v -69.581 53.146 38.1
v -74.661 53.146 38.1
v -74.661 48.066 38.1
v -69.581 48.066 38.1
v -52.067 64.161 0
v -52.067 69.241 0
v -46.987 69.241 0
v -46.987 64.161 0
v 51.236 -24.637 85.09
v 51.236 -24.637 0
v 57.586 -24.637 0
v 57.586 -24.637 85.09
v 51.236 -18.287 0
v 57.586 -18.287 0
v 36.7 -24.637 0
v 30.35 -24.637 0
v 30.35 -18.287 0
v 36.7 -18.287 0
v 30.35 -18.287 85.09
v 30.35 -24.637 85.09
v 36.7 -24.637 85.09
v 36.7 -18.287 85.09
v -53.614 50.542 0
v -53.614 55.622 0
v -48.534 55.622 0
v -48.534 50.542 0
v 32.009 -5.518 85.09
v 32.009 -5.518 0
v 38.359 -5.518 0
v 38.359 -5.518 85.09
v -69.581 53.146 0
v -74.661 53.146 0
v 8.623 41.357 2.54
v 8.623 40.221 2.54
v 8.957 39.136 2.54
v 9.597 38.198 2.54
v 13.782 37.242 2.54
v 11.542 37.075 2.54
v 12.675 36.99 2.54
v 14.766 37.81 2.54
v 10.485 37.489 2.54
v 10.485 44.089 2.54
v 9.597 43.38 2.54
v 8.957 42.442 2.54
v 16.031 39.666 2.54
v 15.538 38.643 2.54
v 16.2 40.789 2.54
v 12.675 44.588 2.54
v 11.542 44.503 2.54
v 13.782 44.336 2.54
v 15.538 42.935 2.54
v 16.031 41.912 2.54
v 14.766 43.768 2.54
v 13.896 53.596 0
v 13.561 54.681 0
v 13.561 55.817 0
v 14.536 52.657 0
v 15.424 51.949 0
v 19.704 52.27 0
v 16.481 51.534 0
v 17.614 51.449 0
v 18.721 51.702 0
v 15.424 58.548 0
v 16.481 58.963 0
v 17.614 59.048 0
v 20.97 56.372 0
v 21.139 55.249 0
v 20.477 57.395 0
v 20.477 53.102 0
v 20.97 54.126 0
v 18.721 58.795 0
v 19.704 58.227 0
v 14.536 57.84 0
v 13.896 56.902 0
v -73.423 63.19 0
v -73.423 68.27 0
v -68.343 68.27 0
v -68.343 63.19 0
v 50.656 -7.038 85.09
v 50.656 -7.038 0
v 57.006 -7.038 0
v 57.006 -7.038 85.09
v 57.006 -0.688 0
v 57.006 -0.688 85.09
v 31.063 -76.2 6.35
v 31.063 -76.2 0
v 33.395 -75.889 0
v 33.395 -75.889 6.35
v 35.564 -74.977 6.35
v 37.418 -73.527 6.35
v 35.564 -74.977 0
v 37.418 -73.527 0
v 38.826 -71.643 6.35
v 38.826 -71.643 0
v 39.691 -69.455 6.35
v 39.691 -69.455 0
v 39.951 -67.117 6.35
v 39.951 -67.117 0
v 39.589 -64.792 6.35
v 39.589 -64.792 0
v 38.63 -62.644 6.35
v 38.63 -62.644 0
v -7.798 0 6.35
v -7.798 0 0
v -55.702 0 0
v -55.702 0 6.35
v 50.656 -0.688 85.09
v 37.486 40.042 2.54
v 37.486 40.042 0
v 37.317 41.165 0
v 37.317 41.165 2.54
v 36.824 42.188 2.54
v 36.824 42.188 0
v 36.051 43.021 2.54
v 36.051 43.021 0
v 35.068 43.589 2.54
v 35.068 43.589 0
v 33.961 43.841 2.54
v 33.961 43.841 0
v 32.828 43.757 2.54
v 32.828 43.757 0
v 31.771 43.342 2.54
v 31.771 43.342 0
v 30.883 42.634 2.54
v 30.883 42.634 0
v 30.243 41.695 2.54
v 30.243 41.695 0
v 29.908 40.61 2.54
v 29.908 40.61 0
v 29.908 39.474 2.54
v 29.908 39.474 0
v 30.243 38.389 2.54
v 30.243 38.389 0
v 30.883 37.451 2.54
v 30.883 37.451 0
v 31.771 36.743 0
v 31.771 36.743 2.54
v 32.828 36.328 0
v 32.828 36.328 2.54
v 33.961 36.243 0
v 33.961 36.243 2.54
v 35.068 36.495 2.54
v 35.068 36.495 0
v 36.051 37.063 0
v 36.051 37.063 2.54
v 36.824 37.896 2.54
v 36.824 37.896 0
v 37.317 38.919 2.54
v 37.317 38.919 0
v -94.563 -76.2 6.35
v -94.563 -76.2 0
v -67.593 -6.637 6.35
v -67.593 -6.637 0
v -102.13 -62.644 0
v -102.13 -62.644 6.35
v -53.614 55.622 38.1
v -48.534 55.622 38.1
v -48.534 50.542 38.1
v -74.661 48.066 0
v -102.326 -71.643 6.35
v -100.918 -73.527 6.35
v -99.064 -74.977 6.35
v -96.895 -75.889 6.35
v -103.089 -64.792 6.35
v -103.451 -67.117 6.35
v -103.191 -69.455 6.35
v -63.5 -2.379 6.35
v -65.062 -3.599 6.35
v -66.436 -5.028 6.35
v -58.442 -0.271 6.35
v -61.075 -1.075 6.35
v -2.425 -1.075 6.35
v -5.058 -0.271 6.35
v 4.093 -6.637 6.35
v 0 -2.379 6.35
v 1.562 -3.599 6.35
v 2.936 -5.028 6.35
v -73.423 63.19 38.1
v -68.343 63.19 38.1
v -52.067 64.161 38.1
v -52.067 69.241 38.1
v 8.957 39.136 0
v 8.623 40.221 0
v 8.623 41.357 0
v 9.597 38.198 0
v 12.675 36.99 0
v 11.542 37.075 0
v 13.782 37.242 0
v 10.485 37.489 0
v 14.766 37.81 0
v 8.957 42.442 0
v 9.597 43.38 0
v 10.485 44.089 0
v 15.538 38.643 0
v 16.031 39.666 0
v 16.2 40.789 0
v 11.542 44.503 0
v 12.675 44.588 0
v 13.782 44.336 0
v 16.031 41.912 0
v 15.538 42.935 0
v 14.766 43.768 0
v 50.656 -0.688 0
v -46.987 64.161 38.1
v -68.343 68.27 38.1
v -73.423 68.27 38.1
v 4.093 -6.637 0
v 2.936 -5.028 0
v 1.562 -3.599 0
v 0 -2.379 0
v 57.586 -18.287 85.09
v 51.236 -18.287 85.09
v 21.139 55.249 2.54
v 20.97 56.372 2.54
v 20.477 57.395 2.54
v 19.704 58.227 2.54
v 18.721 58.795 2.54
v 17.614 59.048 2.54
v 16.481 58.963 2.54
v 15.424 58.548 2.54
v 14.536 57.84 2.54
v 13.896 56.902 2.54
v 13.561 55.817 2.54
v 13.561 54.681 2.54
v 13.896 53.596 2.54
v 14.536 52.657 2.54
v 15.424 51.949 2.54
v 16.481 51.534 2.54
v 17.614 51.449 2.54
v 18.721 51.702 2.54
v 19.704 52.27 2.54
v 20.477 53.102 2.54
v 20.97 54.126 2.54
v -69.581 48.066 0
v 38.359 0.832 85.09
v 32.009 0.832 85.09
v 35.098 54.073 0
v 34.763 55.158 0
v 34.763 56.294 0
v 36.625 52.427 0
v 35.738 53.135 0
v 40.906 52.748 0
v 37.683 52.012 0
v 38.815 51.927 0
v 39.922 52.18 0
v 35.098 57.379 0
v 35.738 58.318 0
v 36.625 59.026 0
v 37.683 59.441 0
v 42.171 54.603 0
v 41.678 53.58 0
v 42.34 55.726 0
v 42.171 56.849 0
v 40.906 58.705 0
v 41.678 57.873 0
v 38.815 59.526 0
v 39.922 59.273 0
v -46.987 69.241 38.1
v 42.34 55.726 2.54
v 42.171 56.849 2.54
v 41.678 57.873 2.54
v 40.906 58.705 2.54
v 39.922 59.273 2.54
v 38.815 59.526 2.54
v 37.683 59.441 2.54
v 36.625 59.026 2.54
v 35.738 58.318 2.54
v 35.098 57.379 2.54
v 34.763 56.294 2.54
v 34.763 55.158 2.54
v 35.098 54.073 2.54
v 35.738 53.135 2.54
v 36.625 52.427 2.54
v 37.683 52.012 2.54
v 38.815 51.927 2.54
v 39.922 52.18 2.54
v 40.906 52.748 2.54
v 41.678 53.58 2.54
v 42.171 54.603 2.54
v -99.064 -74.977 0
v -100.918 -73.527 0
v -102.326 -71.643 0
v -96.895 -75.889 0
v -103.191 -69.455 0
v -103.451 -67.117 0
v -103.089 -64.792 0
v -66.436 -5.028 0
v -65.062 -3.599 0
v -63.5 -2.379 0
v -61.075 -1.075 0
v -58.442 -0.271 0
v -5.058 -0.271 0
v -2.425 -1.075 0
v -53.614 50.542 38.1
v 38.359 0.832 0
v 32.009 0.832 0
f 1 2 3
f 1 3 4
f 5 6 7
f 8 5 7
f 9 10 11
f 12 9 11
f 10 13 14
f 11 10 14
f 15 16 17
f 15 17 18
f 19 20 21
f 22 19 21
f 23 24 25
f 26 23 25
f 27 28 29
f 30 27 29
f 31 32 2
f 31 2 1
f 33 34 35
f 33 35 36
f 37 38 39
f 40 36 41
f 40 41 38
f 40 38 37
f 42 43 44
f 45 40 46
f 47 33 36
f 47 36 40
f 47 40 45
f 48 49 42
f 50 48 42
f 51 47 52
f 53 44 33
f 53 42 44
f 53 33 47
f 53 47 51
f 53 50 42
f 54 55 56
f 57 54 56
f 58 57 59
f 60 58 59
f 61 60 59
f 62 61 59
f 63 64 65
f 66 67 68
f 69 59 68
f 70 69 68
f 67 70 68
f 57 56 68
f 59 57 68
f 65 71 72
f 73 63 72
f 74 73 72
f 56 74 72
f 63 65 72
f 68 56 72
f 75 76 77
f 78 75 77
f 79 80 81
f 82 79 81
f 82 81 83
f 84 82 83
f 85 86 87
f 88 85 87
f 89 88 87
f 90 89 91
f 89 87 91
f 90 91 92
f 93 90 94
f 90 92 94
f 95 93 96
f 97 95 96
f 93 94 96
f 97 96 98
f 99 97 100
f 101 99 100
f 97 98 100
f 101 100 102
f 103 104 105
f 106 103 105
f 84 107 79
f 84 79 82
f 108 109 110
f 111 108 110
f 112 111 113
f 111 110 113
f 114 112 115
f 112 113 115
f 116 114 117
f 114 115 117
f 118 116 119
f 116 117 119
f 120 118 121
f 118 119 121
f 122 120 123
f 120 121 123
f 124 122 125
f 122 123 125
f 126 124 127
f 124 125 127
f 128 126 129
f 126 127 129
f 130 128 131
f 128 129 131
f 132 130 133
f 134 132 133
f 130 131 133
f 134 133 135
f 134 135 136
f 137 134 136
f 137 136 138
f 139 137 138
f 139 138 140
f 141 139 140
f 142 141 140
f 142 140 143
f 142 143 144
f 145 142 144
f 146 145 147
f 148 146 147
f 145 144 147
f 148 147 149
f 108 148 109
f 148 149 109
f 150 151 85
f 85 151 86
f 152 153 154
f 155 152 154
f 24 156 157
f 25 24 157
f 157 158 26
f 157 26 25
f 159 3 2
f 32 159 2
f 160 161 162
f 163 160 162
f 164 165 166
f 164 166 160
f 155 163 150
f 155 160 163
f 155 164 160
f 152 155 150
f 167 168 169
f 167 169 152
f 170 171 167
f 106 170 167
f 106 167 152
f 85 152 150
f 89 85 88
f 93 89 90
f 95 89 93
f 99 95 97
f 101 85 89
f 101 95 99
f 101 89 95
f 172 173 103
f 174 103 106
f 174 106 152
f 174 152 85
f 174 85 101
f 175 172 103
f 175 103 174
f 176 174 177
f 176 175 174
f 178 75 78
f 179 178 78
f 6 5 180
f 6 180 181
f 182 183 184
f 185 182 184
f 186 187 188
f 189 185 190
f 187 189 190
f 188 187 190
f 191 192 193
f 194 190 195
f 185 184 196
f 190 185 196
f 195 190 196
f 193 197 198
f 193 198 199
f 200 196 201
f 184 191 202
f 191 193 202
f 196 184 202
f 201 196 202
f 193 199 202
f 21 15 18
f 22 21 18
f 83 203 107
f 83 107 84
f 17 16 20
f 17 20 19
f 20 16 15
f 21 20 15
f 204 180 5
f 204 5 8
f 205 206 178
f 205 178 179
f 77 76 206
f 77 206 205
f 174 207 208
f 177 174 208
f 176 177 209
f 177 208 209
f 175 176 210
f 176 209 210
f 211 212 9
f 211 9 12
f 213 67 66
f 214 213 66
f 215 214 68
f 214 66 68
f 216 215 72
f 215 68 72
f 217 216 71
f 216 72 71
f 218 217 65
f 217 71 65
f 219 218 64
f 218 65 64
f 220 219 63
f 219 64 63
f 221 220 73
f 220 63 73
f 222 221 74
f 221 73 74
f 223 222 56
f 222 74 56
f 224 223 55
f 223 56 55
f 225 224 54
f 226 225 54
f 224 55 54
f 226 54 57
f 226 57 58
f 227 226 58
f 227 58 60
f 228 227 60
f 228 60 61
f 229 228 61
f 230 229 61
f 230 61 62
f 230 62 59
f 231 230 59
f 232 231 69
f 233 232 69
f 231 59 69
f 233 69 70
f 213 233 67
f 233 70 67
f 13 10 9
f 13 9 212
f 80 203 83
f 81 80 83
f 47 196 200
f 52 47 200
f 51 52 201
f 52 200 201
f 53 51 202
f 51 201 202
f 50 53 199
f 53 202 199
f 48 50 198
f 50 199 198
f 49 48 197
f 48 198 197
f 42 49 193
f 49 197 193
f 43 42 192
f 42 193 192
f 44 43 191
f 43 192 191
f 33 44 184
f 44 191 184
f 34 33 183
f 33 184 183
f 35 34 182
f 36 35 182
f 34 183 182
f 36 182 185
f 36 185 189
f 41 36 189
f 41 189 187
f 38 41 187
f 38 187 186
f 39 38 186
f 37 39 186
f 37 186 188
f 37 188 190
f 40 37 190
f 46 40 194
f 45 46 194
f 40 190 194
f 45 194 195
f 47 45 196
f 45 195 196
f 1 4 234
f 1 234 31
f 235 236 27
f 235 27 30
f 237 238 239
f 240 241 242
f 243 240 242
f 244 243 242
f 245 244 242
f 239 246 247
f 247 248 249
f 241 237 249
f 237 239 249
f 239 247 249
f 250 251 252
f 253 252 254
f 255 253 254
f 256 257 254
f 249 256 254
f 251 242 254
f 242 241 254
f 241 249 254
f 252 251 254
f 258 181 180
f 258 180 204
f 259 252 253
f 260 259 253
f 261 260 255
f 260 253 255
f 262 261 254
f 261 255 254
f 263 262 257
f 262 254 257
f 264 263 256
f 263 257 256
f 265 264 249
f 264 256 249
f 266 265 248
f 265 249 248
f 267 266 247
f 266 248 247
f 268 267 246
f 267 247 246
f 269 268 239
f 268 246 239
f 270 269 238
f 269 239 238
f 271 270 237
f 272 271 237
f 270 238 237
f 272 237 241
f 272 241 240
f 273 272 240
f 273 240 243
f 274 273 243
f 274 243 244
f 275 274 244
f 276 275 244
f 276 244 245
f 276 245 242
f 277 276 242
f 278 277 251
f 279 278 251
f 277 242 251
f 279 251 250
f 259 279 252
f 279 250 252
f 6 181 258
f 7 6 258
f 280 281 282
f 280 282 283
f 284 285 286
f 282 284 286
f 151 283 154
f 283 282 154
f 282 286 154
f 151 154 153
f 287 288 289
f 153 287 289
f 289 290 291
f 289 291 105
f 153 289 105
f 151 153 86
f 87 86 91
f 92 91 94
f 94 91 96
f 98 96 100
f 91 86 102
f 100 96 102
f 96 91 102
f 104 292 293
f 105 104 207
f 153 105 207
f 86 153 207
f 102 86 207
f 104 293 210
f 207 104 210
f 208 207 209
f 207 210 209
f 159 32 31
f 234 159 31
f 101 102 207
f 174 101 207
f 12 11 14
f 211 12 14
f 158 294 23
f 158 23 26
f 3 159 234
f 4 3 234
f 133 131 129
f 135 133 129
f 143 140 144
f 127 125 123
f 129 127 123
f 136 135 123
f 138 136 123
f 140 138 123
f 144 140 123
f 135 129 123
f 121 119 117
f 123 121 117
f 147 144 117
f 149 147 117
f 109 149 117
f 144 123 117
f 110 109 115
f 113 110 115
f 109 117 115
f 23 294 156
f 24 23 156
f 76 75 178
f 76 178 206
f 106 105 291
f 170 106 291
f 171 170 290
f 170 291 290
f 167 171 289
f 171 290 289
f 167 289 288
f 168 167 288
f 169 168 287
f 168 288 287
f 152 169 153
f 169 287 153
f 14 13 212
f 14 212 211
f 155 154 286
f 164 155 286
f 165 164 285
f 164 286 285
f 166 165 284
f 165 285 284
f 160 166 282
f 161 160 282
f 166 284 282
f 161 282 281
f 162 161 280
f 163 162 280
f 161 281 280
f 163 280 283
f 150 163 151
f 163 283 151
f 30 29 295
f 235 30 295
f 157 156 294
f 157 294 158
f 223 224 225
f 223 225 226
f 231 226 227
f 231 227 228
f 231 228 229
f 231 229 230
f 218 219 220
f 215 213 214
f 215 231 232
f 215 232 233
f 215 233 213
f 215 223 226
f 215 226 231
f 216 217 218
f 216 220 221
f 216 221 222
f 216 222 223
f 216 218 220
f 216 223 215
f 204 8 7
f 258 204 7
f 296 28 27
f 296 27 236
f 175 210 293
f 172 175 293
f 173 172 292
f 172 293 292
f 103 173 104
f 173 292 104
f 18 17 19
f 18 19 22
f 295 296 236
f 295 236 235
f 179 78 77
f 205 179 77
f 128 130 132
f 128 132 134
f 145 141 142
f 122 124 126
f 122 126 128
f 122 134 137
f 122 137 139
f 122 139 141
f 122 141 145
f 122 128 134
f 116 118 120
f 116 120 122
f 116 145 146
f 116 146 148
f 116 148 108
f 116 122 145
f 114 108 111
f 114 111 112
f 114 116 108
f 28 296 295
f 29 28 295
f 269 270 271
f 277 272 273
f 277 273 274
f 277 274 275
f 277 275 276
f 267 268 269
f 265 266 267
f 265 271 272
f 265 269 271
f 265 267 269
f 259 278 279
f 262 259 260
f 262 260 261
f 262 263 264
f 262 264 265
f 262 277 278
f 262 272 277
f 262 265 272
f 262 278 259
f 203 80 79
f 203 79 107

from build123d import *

# Parameters (mm, degrees)
F1_DEPTH = 6.35
F2_W     = 6.35
F2_H     = 6.35
F3_DEPTH = 85.09
F4_W     = 5.08
F4_H     = 5.08
F5_DEPTH = 38.1
F6_R     = 3.81
F7_DEPTH = 2.54


with BuildPart() as f1:
    # F0 (on Top) → F1 (new body)
    with BuildSketch(Plane.XY):
        with BuildLine():
            Line((-63.5, -76.2), (-63.5, -2.378866))
            ThreePointArc((-63.5, -2.378866), (-65.774133, -4.289297), (-67.593005, -6.637305))
            Line((-67.593005, -6.637305), (-102.130306, -62.643739))
            ThreePointArc((-102.130306, -62.643739), (-102.325972, -71.642958), (-94.563397, -76.2))
            Line((-94.563397, -76.2), (-63.5, -76.2))
        make_face()
        with BuildLine():
            Line((-7.797852, 0), (-55.702148, 0))
            ThreePointArc((-55.702148, 0), (-59.778467, -0.607945), (-63.5, -2.378866))
            Line((-63.5, -2.378866), (-63.5, -76.2))
            Line((-63.5, -76.2), (0, -76.2))
            Line((0, -76.2), (0, -2.378866))
            ThreePointArc((0, -2.378866), (-3.721533, -0.607945), (-7.797852, 0))
        make_face()
        with BuildLine():
            ThreePointArc((4.093005, -6.637305), (2.274133, -4.289297), (0, -2.378866))
            Line((0, -2.378866), (0, -76.2))
            Line((0, -76.2), (31.063397, -76.2))
            ThreePointArc((31.063397, -76.2), (38.825972, -71.642958), (38.630306, -62.643739))
            Line((38.630306, -62.643739), (4.093005, -6.637305))
        make_face()
    extrude(amount=F1_DEPTH)


with BuildPart() as f3:
    # F2 (on Top) → F3 (new body)
    with BuildSketch(Plane.XY):
        with Locations((35.184462, -2.343281)):
            Rectangle(F2_W, F2_H)
        with Locations((53.830995, -3.863306)):
            Rectangle(F2_W, F2_H)
        with Locations((33.524612, -21.462166)):
            Rectangle(F2_W, F2_H)
        with Locations((54.411175, -21.462167)):
            Rectangle(F2_W, F2_H)
    extrude(amount=F3_DEPTH)


with BuildPart() as f5:
    # F4 (on Top) → F5 (new body)
    with BuildSketch(Plane.XY):
        with Locations((-72.121397, 50.605938)):
            Rectangle(F4_W, F4_H)
        with Locations((-51.074278, 53.082071)):
            Rectangle(F4_W, F4_H)
        with Locations((-70.883326, 65.730097)):
            Rectangle(F4_W, F4_H)
        with Locations((-49.526695, 66.700794)):
            Rectangle(F4_W, F4_H)
    extrude(amount=F5_DEPTH)


with BuildPart() as f7:
    # F6 (on Top) → F7 (new body)
    with BuildSketch(Plane.XY):
        with Locations((38.530488, 55.726297)):
            Circle(F6_R)
        with Locations((12.390179, 40.788982)):
            Circle(F6_R)
        with Locations((33.675861, 40.042114)):
            Circle(F6_R)
        with Locations((17.328855, 55.248685)):
            Circle(F6_R)
    extrude(amount=F7_DEPTH)


solid = Compound([f1.part, f3.part, f5.part, f7.part])
